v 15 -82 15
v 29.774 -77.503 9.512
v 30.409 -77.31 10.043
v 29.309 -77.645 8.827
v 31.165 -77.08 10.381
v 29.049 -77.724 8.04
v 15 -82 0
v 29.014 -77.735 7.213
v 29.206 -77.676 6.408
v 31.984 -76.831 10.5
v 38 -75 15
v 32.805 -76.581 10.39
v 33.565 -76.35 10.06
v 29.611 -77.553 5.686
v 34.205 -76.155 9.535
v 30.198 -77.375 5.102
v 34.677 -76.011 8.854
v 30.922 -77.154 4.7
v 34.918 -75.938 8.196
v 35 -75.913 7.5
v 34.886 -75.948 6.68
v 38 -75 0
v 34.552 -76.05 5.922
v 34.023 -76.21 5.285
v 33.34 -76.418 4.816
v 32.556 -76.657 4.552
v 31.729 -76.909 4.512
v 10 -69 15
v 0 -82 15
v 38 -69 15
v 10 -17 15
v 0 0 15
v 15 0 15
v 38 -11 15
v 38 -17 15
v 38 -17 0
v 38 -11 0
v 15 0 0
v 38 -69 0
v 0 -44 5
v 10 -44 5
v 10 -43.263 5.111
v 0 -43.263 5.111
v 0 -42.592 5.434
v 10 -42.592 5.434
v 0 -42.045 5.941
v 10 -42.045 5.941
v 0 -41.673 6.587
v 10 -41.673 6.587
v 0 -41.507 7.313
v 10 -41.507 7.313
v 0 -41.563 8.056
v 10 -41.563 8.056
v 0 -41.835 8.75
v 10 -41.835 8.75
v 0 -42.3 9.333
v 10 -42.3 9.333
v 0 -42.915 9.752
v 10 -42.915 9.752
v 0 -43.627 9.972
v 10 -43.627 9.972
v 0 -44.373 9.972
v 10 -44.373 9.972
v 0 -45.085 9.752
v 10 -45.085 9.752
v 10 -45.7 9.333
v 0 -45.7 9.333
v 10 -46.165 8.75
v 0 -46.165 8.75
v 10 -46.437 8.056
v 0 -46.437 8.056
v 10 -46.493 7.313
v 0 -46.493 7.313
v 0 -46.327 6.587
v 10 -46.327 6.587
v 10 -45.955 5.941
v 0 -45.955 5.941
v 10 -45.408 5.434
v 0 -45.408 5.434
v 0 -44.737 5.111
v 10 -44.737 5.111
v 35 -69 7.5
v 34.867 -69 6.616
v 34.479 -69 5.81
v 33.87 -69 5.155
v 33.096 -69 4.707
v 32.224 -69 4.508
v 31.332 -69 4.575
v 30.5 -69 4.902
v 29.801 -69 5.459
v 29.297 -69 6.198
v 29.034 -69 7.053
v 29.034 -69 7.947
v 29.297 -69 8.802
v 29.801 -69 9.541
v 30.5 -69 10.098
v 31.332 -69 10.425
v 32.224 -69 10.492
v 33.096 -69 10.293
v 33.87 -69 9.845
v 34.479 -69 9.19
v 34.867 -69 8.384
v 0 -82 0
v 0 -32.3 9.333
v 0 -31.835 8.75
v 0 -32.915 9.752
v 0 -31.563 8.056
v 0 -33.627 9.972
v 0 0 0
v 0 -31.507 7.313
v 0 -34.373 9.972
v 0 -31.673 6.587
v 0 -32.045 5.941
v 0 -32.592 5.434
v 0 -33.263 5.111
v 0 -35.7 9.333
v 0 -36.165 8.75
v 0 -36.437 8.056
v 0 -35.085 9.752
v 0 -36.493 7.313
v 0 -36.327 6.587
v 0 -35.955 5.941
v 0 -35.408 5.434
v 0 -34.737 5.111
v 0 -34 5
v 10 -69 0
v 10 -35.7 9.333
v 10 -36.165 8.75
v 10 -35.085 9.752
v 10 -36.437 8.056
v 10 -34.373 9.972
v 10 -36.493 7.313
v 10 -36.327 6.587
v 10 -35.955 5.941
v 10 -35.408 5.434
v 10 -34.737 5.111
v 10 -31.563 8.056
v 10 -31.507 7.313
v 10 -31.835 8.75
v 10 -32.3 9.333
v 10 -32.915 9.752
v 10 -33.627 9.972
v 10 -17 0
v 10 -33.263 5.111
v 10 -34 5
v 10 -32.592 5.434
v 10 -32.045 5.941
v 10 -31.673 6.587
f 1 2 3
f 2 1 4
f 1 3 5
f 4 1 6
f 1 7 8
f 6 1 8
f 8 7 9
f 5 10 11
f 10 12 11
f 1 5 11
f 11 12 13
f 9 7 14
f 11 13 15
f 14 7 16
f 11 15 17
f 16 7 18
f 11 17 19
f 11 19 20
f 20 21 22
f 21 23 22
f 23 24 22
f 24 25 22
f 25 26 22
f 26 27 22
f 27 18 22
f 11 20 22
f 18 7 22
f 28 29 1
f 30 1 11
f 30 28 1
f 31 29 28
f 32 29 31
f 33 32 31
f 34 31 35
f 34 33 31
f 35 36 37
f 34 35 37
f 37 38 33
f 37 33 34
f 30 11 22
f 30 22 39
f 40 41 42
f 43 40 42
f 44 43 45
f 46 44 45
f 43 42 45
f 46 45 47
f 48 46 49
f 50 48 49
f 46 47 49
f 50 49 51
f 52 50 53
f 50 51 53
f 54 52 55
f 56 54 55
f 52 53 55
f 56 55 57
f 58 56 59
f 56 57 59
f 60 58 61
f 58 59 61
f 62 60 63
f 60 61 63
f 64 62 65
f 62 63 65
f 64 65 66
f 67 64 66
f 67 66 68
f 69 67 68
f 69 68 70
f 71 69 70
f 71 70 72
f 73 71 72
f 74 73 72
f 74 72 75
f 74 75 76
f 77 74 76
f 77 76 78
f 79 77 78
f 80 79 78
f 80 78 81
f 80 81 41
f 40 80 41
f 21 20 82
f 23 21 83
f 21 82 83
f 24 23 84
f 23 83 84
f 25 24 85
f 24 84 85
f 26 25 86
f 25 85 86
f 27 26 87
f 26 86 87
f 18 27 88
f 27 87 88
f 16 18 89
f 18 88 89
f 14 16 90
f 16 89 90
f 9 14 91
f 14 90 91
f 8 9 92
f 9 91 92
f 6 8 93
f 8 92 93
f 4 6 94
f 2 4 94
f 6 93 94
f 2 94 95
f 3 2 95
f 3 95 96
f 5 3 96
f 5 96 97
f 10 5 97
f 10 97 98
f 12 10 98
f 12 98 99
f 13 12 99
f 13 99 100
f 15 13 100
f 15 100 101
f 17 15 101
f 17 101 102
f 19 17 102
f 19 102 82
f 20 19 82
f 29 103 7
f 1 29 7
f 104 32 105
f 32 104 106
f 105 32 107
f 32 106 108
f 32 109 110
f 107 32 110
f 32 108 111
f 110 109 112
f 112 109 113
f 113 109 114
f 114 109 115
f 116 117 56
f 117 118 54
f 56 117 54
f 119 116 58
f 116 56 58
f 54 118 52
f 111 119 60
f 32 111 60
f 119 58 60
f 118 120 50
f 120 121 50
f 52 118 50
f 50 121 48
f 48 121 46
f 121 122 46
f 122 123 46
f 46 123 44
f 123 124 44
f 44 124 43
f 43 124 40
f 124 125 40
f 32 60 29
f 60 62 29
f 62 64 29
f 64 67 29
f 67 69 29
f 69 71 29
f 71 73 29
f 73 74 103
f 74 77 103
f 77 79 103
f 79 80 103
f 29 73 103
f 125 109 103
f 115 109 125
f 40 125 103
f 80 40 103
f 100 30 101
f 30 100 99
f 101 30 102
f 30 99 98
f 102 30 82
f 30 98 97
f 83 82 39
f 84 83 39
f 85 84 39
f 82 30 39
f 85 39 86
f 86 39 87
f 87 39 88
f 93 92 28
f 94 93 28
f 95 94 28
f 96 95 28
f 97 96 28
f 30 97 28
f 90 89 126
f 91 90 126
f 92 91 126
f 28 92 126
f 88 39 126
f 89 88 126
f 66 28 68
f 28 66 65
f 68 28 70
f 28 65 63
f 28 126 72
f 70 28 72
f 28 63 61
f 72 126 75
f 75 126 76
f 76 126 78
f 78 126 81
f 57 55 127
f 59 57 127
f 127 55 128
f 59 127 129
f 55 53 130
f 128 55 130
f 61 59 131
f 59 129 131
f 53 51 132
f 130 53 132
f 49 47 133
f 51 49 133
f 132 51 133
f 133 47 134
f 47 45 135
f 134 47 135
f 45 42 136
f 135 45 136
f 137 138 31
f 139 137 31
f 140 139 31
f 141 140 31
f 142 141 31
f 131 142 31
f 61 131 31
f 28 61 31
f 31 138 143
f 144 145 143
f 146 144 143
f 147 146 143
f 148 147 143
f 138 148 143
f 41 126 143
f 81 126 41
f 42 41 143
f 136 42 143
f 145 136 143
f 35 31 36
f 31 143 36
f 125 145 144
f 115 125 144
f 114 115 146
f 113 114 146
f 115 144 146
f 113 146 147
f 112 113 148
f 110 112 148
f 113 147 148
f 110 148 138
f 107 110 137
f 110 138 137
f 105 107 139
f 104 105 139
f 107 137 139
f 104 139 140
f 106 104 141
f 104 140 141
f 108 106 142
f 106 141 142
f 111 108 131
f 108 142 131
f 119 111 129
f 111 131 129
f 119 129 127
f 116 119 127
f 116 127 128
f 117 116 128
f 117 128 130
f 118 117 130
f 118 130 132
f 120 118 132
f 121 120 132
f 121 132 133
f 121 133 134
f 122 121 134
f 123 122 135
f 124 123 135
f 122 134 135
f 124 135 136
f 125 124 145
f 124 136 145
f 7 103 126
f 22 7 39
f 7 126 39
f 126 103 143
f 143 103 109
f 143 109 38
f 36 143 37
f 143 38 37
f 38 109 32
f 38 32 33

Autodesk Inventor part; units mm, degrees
ref_plane "YZ Plane" through (0, 0, 0) normal (1, 0, 0) x (0, 1, 0)
ref_plane "XZ Plane" through (0, 0, 0) normal (0, 1, 0) x (-1, 0, 0)
ref_plane "XY Plane" through (0, 0, 0) normal (0, 0, 1) x (1, 0, 0)
sketch "Sketch1" plane through (0, 0, 0) normal (0, 0, 1) x (1, 0, 0)
  line L0 (0, 0) -> (0, -82)
  line L1 (0, -82) -> (15, -82)
  line L2 (15, -82) -> (15, -75) construction
  line L3 (15, -75) -> (38, -75) construction
  line L4 (15, -82) -> (38, -75)
  line L5 (38, -75) -> (38, -69)
  line L6 (38, -69) -> (10, -69)
  line L7 (10, -69) -> (10, -17)
  line L8 (10, -17) -> (38, -17)
  line L9 (38, -17) -> (38, -11)
  line L10 (0, 0) -> (15, 0)
  line L11 (15, 0) -> (38, -11)
  dimension "d0" = 82
  dimension "d1" = 15
  dimension "d2" = 90
  dimension "d3" = 7
  dimension "d4" = 23
  dimension "d5" = 6
  dimension "d6" = 28
  dimension "d7" = 90
  dimension "d8" = 52
  dimension "d9" = 90
  dimension "d10" = 28
  dimension "d11" = 6
  dimension "d12" = 15
extrude "Extrusion1" add sketch "Sketch1" along normal blind 15
sketch "Sketch2" plane through (10, -69, 0) normal (0, 1, 0) x (1, 0, 0)
  line L0 (5, 0) -> (28, 0) projected
  line L1 (28, 0) -> (28, -15) projected
  line L2 (5, -15) -> (28, -15) projected
  line L3 (5, 0) -> (5, -15) projected
  line L4 (28, 0) -> (28, -15) construction
  line L5 (28, -7.5) -> (22, -7.5) construction
  circle A0 centre (22, -7.5) radius 3
  point P0 (-10, 0)
  dimension "d15" = 6
  dimension "d16" = 6
extrude "Extrusion2" cut sketch "Sketch2" against normal blind 15 contours A0
sketch "Sketch3" plane through (10, -69, 0) normal (1, 0, 0) x (0, 0, -1)
  line L0 (0, 52) -> (-15, 52) construction
  line L1 (-7.5, 52) -> (-7.5, 35) construction
  line L2 (-7.5, 52) -> (9.5, 52) construction
  line L3 (-7.5, 35) -> (-7.5, 25) construction
  circle A0 centre (-7.5, 35) radius 2.5
  circle A1 centre (-7.5, 25) radius 2.5
  point P0 (0, 69)
  dimension "d19" = 17
  dimension "d20" = 90
  dimension "d21" = 10
  dimension "d22" = 5
  dimension "d23" = 5
extrude "Extrusion3" cut sketch "Sketch3" against normal blind 15
properties part number "clamp"
